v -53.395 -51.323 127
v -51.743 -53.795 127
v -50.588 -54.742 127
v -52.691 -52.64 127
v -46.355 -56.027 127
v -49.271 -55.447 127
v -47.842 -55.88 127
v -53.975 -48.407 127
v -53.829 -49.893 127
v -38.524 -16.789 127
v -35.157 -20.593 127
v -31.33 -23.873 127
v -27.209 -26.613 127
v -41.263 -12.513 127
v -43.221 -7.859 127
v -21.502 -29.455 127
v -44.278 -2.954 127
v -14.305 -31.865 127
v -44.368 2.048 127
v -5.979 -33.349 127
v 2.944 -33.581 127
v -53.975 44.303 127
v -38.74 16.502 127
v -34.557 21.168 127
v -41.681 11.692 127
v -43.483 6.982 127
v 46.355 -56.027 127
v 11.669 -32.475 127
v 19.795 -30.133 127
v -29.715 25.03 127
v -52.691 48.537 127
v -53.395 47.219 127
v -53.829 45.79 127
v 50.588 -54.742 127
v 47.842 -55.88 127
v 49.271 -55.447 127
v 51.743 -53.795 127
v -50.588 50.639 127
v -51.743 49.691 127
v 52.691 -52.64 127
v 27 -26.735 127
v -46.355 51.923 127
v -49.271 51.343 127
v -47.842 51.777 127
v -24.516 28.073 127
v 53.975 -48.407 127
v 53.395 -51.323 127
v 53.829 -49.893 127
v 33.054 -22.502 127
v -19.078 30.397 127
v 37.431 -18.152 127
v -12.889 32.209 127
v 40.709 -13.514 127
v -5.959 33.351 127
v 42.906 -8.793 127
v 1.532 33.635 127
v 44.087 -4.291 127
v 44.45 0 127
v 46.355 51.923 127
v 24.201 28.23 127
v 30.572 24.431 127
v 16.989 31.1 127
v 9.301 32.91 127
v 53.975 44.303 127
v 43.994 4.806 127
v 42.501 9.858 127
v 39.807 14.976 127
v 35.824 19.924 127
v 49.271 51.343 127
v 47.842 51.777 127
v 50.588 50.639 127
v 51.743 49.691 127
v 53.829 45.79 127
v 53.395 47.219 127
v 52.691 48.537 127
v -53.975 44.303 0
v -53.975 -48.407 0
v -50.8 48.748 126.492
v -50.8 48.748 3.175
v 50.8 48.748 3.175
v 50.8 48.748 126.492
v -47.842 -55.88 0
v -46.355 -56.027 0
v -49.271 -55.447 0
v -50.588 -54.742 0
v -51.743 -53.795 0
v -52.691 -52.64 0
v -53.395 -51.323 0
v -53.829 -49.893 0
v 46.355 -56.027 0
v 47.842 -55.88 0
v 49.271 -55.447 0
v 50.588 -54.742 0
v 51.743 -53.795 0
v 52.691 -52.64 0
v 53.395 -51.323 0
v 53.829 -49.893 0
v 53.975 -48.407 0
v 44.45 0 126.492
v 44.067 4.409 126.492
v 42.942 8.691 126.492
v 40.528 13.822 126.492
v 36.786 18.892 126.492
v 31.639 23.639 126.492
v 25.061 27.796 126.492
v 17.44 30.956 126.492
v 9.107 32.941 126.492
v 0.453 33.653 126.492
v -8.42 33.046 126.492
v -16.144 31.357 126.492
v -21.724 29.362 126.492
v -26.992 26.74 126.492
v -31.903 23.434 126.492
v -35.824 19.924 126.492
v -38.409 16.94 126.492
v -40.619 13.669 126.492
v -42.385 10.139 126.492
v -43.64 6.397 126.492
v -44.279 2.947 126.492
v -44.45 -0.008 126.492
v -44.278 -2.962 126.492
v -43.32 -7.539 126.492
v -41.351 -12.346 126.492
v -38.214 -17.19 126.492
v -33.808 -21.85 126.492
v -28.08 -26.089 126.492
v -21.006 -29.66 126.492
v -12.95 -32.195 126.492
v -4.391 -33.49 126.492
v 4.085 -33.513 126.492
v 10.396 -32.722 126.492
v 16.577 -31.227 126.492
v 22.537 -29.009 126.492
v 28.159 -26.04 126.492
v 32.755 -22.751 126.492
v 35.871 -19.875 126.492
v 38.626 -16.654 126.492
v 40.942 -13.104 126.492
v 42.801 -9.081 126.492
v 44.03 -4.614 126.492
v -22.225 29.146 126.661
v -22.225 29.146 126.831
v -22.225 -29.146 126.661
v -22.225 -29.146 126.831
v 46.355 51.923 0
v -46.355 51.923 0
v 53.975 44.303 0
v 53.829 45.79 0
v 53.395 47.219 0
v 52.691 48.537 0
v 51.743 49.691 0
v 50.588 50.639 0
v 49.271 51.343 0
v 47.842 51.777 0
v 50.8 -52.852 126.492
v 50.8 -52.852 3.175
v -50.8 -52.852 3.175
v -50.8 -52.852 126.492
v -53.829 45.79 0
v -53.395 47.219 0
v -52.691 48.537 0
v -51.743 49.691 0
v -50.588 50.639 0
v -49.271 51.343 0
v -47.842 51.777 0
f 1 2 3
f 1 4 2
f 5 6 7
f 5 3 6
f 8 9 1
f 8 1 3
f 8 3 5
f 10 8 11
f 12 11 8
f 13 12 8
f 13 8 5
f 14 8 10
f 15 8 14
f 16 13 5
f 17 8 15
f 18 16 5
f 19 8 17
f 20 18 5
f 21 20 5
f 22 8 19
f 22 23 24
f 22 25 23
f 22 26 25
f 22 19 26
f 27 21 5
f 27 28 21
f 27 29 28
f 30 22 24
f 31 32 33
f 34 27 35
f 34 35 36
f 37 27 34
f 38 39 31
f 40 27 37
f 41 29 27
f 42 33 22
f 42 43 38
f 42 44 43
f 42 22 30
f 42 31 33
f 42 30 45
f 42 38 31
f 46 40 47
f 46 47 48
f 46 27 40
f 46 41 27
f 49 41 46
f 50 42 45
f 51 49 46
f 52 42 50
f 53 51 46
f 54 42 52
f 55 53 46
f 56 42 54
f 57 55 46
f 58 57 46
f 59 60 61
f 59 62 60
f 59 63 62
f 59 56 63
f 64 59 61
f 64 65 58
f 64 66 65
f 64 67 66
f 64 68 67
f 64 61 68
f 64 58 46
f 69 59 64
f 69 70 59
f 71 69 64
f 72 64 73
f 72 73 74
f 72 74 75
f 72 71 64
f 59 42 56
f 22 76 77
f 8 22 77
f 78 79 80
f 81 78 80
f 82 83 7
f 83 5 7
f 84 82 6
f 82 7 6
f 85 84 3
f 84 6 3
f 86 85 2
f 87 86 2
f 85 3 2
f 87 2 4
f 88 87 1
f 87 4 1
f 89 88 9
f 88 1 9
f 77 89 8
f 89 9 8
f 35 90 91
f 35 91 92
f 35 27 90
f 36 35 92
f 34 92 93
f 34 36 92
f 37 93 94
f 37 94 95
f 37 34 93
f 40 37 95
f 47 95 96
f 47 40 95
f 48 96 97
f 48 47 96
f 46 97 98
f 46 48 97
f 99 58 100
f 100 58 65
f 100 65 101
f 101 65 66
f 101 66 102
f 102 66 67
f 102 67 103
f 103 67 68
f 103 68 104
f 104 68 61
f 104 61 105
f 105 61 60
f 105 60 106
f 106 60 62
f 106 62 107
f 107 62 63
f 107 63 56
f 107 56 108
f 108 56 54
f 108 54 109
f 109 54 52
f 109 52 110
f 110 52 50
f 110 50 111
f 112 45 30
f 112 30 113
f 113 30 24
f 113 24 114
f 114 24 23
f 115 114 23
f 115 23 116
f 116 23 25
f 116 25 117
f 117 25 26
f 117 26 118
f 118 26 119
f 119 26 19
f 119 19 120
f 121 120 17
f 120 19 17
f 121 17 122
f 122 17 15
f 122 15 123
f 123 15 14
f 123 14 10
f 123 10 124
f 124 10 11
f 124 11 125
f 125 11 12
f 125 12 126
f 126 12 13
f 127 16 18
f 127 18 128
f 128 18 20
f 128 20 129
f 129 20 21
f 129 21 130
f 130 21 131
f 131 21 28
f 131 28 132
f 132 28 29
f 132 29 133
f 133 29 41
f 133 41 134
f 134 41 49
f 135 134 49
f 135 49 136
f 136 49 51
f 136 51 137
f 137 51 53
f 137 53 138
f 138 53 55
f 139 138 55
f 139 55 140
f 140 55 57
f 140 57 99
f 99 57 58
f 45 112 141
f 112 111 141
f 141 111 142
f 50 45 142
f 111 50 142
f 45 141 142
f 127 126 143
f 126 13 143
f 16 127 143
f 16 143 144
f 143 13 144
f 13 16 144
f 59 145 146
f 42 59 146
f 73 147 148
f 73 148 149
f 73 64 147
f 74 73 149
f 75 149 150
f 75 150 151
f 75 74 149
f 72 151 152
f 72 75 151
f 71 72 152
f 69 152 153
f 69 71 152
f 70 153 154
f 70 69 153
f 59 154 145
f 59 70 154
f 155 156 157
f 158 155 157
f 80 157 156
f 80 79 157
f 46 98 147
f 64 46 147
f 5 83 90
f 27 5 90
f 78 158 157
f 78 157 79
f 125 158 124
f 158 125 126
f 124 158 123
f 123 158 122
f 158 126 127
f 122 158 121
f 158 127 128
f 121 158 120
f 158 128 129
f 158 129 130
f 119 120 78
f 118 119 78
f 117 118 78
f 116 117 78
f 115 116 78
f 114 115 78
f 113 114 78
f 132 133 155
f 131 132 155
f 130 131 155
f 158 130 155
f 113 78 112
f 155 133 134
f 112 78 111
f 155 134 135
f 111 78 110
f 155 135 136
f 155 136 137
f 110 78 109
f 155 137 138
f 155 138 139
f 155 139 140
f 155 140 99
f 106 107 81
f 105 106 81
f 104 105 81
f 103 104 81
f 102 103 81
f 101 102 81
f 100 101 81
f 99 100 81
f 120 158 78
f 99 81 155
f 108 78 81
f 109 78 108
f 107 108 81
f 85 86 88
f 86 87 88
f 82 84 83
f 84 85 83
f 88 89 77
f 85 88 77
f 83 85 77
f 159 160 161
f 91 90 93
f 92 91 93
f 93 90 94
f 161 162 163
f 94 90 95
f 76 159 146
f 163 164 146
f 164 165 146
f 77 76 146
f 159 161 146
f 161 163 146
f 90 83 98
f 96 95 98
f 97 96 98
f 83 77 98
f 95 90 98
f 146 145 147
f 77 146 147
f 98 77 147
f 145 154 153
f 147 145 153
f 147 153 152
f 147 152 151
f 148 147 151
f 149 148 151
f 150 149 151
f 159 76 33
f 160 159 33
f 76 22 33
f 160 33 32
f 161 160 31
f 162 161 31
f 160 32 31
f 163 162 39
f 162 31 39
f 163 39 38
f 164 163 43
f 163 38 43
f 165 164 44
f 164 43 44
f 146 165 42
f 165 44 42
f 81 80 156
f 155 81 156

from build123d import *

# Parameters (mm, degrees)
F1_DEPTH = 127
F2_DEPTH = 3.175
F3_W     = 101.6
F3_H     = 101.6
F4_DEPTH = 0.508
F6_DEPTH = 12.7
F7_R     = 7.62


with BuildPart() as f1:
    # F0 (on Top) → F1 (new body)
    with BuildSketch(Plane.XY):
        Polygon((-53.975, -56.026683), (0, -56.026683), (53.975, -56.026683), (53.975, 51.923317), (-53.975, 51.923317), align=None)
        Polygon((50.8, -52.851683), (0, -52.851683), (-50.8, -52.851683), (-50.8, 48.748317), (50.8, 48.748317), align=None, mode=Mode.SUBTRACT)
    extrude(amount=F1_DEPTH)

    # F0 (on Top) → F2 (join)
    with BuildSketch(Plane.XY):
        Polygon((-50.8, -52.851683), (0, -52.851683), (50.8, -52.851683), (50.8, 48.748317), (-50.8, 48.748317), align=None)
    extrude(amount=F2_DEPTH)

    # F3 (on face) → F4 (join)
    with BuildSketch(Plane.XY.offset(127)):
        with Locations((0, -2.051683)):
            Rectangle(F3_W, F3_H)
    extrude(amount=-F4_DEPTH)

    # F5 (on face) → F6 (cut)
    with BuildSketch(Plane.XY.offset(127)):
        with BuildLine():
            add(Edge.make_bspline(
                [(44.45, 0), (44.45, 58.29217), (-22.225, 29.146085), (-88.9, 0), (-22.225, -29.146085), (44.45, -58.29217), (44.45, 0)],
                knots=[0, 0, 0, 2.094395, 2.094395, 4.18879, 4.18879, 6.283185, 6.283185, 6.283185], degree=2, weights=[1, 0.5, 1, 0.5, 1, 0.5, 1]))
        make_face()
    extrude(amount=-F6_DEPTH, mode=Mode.SUBTRACT)

    # F7
    f7_edges = [f1.edges().sort_by_distance(p)[0] for p in [
        (-53.975, -56.026683, 63.5),
        (-53.975, 51.923317, 63.5),
        (53.975, 51.923317, 63.5),
        (53.975, -56.026683, 63.5),
    ]]
    fillet(f7_edges, radius=F7_R)


solid = f1.part
